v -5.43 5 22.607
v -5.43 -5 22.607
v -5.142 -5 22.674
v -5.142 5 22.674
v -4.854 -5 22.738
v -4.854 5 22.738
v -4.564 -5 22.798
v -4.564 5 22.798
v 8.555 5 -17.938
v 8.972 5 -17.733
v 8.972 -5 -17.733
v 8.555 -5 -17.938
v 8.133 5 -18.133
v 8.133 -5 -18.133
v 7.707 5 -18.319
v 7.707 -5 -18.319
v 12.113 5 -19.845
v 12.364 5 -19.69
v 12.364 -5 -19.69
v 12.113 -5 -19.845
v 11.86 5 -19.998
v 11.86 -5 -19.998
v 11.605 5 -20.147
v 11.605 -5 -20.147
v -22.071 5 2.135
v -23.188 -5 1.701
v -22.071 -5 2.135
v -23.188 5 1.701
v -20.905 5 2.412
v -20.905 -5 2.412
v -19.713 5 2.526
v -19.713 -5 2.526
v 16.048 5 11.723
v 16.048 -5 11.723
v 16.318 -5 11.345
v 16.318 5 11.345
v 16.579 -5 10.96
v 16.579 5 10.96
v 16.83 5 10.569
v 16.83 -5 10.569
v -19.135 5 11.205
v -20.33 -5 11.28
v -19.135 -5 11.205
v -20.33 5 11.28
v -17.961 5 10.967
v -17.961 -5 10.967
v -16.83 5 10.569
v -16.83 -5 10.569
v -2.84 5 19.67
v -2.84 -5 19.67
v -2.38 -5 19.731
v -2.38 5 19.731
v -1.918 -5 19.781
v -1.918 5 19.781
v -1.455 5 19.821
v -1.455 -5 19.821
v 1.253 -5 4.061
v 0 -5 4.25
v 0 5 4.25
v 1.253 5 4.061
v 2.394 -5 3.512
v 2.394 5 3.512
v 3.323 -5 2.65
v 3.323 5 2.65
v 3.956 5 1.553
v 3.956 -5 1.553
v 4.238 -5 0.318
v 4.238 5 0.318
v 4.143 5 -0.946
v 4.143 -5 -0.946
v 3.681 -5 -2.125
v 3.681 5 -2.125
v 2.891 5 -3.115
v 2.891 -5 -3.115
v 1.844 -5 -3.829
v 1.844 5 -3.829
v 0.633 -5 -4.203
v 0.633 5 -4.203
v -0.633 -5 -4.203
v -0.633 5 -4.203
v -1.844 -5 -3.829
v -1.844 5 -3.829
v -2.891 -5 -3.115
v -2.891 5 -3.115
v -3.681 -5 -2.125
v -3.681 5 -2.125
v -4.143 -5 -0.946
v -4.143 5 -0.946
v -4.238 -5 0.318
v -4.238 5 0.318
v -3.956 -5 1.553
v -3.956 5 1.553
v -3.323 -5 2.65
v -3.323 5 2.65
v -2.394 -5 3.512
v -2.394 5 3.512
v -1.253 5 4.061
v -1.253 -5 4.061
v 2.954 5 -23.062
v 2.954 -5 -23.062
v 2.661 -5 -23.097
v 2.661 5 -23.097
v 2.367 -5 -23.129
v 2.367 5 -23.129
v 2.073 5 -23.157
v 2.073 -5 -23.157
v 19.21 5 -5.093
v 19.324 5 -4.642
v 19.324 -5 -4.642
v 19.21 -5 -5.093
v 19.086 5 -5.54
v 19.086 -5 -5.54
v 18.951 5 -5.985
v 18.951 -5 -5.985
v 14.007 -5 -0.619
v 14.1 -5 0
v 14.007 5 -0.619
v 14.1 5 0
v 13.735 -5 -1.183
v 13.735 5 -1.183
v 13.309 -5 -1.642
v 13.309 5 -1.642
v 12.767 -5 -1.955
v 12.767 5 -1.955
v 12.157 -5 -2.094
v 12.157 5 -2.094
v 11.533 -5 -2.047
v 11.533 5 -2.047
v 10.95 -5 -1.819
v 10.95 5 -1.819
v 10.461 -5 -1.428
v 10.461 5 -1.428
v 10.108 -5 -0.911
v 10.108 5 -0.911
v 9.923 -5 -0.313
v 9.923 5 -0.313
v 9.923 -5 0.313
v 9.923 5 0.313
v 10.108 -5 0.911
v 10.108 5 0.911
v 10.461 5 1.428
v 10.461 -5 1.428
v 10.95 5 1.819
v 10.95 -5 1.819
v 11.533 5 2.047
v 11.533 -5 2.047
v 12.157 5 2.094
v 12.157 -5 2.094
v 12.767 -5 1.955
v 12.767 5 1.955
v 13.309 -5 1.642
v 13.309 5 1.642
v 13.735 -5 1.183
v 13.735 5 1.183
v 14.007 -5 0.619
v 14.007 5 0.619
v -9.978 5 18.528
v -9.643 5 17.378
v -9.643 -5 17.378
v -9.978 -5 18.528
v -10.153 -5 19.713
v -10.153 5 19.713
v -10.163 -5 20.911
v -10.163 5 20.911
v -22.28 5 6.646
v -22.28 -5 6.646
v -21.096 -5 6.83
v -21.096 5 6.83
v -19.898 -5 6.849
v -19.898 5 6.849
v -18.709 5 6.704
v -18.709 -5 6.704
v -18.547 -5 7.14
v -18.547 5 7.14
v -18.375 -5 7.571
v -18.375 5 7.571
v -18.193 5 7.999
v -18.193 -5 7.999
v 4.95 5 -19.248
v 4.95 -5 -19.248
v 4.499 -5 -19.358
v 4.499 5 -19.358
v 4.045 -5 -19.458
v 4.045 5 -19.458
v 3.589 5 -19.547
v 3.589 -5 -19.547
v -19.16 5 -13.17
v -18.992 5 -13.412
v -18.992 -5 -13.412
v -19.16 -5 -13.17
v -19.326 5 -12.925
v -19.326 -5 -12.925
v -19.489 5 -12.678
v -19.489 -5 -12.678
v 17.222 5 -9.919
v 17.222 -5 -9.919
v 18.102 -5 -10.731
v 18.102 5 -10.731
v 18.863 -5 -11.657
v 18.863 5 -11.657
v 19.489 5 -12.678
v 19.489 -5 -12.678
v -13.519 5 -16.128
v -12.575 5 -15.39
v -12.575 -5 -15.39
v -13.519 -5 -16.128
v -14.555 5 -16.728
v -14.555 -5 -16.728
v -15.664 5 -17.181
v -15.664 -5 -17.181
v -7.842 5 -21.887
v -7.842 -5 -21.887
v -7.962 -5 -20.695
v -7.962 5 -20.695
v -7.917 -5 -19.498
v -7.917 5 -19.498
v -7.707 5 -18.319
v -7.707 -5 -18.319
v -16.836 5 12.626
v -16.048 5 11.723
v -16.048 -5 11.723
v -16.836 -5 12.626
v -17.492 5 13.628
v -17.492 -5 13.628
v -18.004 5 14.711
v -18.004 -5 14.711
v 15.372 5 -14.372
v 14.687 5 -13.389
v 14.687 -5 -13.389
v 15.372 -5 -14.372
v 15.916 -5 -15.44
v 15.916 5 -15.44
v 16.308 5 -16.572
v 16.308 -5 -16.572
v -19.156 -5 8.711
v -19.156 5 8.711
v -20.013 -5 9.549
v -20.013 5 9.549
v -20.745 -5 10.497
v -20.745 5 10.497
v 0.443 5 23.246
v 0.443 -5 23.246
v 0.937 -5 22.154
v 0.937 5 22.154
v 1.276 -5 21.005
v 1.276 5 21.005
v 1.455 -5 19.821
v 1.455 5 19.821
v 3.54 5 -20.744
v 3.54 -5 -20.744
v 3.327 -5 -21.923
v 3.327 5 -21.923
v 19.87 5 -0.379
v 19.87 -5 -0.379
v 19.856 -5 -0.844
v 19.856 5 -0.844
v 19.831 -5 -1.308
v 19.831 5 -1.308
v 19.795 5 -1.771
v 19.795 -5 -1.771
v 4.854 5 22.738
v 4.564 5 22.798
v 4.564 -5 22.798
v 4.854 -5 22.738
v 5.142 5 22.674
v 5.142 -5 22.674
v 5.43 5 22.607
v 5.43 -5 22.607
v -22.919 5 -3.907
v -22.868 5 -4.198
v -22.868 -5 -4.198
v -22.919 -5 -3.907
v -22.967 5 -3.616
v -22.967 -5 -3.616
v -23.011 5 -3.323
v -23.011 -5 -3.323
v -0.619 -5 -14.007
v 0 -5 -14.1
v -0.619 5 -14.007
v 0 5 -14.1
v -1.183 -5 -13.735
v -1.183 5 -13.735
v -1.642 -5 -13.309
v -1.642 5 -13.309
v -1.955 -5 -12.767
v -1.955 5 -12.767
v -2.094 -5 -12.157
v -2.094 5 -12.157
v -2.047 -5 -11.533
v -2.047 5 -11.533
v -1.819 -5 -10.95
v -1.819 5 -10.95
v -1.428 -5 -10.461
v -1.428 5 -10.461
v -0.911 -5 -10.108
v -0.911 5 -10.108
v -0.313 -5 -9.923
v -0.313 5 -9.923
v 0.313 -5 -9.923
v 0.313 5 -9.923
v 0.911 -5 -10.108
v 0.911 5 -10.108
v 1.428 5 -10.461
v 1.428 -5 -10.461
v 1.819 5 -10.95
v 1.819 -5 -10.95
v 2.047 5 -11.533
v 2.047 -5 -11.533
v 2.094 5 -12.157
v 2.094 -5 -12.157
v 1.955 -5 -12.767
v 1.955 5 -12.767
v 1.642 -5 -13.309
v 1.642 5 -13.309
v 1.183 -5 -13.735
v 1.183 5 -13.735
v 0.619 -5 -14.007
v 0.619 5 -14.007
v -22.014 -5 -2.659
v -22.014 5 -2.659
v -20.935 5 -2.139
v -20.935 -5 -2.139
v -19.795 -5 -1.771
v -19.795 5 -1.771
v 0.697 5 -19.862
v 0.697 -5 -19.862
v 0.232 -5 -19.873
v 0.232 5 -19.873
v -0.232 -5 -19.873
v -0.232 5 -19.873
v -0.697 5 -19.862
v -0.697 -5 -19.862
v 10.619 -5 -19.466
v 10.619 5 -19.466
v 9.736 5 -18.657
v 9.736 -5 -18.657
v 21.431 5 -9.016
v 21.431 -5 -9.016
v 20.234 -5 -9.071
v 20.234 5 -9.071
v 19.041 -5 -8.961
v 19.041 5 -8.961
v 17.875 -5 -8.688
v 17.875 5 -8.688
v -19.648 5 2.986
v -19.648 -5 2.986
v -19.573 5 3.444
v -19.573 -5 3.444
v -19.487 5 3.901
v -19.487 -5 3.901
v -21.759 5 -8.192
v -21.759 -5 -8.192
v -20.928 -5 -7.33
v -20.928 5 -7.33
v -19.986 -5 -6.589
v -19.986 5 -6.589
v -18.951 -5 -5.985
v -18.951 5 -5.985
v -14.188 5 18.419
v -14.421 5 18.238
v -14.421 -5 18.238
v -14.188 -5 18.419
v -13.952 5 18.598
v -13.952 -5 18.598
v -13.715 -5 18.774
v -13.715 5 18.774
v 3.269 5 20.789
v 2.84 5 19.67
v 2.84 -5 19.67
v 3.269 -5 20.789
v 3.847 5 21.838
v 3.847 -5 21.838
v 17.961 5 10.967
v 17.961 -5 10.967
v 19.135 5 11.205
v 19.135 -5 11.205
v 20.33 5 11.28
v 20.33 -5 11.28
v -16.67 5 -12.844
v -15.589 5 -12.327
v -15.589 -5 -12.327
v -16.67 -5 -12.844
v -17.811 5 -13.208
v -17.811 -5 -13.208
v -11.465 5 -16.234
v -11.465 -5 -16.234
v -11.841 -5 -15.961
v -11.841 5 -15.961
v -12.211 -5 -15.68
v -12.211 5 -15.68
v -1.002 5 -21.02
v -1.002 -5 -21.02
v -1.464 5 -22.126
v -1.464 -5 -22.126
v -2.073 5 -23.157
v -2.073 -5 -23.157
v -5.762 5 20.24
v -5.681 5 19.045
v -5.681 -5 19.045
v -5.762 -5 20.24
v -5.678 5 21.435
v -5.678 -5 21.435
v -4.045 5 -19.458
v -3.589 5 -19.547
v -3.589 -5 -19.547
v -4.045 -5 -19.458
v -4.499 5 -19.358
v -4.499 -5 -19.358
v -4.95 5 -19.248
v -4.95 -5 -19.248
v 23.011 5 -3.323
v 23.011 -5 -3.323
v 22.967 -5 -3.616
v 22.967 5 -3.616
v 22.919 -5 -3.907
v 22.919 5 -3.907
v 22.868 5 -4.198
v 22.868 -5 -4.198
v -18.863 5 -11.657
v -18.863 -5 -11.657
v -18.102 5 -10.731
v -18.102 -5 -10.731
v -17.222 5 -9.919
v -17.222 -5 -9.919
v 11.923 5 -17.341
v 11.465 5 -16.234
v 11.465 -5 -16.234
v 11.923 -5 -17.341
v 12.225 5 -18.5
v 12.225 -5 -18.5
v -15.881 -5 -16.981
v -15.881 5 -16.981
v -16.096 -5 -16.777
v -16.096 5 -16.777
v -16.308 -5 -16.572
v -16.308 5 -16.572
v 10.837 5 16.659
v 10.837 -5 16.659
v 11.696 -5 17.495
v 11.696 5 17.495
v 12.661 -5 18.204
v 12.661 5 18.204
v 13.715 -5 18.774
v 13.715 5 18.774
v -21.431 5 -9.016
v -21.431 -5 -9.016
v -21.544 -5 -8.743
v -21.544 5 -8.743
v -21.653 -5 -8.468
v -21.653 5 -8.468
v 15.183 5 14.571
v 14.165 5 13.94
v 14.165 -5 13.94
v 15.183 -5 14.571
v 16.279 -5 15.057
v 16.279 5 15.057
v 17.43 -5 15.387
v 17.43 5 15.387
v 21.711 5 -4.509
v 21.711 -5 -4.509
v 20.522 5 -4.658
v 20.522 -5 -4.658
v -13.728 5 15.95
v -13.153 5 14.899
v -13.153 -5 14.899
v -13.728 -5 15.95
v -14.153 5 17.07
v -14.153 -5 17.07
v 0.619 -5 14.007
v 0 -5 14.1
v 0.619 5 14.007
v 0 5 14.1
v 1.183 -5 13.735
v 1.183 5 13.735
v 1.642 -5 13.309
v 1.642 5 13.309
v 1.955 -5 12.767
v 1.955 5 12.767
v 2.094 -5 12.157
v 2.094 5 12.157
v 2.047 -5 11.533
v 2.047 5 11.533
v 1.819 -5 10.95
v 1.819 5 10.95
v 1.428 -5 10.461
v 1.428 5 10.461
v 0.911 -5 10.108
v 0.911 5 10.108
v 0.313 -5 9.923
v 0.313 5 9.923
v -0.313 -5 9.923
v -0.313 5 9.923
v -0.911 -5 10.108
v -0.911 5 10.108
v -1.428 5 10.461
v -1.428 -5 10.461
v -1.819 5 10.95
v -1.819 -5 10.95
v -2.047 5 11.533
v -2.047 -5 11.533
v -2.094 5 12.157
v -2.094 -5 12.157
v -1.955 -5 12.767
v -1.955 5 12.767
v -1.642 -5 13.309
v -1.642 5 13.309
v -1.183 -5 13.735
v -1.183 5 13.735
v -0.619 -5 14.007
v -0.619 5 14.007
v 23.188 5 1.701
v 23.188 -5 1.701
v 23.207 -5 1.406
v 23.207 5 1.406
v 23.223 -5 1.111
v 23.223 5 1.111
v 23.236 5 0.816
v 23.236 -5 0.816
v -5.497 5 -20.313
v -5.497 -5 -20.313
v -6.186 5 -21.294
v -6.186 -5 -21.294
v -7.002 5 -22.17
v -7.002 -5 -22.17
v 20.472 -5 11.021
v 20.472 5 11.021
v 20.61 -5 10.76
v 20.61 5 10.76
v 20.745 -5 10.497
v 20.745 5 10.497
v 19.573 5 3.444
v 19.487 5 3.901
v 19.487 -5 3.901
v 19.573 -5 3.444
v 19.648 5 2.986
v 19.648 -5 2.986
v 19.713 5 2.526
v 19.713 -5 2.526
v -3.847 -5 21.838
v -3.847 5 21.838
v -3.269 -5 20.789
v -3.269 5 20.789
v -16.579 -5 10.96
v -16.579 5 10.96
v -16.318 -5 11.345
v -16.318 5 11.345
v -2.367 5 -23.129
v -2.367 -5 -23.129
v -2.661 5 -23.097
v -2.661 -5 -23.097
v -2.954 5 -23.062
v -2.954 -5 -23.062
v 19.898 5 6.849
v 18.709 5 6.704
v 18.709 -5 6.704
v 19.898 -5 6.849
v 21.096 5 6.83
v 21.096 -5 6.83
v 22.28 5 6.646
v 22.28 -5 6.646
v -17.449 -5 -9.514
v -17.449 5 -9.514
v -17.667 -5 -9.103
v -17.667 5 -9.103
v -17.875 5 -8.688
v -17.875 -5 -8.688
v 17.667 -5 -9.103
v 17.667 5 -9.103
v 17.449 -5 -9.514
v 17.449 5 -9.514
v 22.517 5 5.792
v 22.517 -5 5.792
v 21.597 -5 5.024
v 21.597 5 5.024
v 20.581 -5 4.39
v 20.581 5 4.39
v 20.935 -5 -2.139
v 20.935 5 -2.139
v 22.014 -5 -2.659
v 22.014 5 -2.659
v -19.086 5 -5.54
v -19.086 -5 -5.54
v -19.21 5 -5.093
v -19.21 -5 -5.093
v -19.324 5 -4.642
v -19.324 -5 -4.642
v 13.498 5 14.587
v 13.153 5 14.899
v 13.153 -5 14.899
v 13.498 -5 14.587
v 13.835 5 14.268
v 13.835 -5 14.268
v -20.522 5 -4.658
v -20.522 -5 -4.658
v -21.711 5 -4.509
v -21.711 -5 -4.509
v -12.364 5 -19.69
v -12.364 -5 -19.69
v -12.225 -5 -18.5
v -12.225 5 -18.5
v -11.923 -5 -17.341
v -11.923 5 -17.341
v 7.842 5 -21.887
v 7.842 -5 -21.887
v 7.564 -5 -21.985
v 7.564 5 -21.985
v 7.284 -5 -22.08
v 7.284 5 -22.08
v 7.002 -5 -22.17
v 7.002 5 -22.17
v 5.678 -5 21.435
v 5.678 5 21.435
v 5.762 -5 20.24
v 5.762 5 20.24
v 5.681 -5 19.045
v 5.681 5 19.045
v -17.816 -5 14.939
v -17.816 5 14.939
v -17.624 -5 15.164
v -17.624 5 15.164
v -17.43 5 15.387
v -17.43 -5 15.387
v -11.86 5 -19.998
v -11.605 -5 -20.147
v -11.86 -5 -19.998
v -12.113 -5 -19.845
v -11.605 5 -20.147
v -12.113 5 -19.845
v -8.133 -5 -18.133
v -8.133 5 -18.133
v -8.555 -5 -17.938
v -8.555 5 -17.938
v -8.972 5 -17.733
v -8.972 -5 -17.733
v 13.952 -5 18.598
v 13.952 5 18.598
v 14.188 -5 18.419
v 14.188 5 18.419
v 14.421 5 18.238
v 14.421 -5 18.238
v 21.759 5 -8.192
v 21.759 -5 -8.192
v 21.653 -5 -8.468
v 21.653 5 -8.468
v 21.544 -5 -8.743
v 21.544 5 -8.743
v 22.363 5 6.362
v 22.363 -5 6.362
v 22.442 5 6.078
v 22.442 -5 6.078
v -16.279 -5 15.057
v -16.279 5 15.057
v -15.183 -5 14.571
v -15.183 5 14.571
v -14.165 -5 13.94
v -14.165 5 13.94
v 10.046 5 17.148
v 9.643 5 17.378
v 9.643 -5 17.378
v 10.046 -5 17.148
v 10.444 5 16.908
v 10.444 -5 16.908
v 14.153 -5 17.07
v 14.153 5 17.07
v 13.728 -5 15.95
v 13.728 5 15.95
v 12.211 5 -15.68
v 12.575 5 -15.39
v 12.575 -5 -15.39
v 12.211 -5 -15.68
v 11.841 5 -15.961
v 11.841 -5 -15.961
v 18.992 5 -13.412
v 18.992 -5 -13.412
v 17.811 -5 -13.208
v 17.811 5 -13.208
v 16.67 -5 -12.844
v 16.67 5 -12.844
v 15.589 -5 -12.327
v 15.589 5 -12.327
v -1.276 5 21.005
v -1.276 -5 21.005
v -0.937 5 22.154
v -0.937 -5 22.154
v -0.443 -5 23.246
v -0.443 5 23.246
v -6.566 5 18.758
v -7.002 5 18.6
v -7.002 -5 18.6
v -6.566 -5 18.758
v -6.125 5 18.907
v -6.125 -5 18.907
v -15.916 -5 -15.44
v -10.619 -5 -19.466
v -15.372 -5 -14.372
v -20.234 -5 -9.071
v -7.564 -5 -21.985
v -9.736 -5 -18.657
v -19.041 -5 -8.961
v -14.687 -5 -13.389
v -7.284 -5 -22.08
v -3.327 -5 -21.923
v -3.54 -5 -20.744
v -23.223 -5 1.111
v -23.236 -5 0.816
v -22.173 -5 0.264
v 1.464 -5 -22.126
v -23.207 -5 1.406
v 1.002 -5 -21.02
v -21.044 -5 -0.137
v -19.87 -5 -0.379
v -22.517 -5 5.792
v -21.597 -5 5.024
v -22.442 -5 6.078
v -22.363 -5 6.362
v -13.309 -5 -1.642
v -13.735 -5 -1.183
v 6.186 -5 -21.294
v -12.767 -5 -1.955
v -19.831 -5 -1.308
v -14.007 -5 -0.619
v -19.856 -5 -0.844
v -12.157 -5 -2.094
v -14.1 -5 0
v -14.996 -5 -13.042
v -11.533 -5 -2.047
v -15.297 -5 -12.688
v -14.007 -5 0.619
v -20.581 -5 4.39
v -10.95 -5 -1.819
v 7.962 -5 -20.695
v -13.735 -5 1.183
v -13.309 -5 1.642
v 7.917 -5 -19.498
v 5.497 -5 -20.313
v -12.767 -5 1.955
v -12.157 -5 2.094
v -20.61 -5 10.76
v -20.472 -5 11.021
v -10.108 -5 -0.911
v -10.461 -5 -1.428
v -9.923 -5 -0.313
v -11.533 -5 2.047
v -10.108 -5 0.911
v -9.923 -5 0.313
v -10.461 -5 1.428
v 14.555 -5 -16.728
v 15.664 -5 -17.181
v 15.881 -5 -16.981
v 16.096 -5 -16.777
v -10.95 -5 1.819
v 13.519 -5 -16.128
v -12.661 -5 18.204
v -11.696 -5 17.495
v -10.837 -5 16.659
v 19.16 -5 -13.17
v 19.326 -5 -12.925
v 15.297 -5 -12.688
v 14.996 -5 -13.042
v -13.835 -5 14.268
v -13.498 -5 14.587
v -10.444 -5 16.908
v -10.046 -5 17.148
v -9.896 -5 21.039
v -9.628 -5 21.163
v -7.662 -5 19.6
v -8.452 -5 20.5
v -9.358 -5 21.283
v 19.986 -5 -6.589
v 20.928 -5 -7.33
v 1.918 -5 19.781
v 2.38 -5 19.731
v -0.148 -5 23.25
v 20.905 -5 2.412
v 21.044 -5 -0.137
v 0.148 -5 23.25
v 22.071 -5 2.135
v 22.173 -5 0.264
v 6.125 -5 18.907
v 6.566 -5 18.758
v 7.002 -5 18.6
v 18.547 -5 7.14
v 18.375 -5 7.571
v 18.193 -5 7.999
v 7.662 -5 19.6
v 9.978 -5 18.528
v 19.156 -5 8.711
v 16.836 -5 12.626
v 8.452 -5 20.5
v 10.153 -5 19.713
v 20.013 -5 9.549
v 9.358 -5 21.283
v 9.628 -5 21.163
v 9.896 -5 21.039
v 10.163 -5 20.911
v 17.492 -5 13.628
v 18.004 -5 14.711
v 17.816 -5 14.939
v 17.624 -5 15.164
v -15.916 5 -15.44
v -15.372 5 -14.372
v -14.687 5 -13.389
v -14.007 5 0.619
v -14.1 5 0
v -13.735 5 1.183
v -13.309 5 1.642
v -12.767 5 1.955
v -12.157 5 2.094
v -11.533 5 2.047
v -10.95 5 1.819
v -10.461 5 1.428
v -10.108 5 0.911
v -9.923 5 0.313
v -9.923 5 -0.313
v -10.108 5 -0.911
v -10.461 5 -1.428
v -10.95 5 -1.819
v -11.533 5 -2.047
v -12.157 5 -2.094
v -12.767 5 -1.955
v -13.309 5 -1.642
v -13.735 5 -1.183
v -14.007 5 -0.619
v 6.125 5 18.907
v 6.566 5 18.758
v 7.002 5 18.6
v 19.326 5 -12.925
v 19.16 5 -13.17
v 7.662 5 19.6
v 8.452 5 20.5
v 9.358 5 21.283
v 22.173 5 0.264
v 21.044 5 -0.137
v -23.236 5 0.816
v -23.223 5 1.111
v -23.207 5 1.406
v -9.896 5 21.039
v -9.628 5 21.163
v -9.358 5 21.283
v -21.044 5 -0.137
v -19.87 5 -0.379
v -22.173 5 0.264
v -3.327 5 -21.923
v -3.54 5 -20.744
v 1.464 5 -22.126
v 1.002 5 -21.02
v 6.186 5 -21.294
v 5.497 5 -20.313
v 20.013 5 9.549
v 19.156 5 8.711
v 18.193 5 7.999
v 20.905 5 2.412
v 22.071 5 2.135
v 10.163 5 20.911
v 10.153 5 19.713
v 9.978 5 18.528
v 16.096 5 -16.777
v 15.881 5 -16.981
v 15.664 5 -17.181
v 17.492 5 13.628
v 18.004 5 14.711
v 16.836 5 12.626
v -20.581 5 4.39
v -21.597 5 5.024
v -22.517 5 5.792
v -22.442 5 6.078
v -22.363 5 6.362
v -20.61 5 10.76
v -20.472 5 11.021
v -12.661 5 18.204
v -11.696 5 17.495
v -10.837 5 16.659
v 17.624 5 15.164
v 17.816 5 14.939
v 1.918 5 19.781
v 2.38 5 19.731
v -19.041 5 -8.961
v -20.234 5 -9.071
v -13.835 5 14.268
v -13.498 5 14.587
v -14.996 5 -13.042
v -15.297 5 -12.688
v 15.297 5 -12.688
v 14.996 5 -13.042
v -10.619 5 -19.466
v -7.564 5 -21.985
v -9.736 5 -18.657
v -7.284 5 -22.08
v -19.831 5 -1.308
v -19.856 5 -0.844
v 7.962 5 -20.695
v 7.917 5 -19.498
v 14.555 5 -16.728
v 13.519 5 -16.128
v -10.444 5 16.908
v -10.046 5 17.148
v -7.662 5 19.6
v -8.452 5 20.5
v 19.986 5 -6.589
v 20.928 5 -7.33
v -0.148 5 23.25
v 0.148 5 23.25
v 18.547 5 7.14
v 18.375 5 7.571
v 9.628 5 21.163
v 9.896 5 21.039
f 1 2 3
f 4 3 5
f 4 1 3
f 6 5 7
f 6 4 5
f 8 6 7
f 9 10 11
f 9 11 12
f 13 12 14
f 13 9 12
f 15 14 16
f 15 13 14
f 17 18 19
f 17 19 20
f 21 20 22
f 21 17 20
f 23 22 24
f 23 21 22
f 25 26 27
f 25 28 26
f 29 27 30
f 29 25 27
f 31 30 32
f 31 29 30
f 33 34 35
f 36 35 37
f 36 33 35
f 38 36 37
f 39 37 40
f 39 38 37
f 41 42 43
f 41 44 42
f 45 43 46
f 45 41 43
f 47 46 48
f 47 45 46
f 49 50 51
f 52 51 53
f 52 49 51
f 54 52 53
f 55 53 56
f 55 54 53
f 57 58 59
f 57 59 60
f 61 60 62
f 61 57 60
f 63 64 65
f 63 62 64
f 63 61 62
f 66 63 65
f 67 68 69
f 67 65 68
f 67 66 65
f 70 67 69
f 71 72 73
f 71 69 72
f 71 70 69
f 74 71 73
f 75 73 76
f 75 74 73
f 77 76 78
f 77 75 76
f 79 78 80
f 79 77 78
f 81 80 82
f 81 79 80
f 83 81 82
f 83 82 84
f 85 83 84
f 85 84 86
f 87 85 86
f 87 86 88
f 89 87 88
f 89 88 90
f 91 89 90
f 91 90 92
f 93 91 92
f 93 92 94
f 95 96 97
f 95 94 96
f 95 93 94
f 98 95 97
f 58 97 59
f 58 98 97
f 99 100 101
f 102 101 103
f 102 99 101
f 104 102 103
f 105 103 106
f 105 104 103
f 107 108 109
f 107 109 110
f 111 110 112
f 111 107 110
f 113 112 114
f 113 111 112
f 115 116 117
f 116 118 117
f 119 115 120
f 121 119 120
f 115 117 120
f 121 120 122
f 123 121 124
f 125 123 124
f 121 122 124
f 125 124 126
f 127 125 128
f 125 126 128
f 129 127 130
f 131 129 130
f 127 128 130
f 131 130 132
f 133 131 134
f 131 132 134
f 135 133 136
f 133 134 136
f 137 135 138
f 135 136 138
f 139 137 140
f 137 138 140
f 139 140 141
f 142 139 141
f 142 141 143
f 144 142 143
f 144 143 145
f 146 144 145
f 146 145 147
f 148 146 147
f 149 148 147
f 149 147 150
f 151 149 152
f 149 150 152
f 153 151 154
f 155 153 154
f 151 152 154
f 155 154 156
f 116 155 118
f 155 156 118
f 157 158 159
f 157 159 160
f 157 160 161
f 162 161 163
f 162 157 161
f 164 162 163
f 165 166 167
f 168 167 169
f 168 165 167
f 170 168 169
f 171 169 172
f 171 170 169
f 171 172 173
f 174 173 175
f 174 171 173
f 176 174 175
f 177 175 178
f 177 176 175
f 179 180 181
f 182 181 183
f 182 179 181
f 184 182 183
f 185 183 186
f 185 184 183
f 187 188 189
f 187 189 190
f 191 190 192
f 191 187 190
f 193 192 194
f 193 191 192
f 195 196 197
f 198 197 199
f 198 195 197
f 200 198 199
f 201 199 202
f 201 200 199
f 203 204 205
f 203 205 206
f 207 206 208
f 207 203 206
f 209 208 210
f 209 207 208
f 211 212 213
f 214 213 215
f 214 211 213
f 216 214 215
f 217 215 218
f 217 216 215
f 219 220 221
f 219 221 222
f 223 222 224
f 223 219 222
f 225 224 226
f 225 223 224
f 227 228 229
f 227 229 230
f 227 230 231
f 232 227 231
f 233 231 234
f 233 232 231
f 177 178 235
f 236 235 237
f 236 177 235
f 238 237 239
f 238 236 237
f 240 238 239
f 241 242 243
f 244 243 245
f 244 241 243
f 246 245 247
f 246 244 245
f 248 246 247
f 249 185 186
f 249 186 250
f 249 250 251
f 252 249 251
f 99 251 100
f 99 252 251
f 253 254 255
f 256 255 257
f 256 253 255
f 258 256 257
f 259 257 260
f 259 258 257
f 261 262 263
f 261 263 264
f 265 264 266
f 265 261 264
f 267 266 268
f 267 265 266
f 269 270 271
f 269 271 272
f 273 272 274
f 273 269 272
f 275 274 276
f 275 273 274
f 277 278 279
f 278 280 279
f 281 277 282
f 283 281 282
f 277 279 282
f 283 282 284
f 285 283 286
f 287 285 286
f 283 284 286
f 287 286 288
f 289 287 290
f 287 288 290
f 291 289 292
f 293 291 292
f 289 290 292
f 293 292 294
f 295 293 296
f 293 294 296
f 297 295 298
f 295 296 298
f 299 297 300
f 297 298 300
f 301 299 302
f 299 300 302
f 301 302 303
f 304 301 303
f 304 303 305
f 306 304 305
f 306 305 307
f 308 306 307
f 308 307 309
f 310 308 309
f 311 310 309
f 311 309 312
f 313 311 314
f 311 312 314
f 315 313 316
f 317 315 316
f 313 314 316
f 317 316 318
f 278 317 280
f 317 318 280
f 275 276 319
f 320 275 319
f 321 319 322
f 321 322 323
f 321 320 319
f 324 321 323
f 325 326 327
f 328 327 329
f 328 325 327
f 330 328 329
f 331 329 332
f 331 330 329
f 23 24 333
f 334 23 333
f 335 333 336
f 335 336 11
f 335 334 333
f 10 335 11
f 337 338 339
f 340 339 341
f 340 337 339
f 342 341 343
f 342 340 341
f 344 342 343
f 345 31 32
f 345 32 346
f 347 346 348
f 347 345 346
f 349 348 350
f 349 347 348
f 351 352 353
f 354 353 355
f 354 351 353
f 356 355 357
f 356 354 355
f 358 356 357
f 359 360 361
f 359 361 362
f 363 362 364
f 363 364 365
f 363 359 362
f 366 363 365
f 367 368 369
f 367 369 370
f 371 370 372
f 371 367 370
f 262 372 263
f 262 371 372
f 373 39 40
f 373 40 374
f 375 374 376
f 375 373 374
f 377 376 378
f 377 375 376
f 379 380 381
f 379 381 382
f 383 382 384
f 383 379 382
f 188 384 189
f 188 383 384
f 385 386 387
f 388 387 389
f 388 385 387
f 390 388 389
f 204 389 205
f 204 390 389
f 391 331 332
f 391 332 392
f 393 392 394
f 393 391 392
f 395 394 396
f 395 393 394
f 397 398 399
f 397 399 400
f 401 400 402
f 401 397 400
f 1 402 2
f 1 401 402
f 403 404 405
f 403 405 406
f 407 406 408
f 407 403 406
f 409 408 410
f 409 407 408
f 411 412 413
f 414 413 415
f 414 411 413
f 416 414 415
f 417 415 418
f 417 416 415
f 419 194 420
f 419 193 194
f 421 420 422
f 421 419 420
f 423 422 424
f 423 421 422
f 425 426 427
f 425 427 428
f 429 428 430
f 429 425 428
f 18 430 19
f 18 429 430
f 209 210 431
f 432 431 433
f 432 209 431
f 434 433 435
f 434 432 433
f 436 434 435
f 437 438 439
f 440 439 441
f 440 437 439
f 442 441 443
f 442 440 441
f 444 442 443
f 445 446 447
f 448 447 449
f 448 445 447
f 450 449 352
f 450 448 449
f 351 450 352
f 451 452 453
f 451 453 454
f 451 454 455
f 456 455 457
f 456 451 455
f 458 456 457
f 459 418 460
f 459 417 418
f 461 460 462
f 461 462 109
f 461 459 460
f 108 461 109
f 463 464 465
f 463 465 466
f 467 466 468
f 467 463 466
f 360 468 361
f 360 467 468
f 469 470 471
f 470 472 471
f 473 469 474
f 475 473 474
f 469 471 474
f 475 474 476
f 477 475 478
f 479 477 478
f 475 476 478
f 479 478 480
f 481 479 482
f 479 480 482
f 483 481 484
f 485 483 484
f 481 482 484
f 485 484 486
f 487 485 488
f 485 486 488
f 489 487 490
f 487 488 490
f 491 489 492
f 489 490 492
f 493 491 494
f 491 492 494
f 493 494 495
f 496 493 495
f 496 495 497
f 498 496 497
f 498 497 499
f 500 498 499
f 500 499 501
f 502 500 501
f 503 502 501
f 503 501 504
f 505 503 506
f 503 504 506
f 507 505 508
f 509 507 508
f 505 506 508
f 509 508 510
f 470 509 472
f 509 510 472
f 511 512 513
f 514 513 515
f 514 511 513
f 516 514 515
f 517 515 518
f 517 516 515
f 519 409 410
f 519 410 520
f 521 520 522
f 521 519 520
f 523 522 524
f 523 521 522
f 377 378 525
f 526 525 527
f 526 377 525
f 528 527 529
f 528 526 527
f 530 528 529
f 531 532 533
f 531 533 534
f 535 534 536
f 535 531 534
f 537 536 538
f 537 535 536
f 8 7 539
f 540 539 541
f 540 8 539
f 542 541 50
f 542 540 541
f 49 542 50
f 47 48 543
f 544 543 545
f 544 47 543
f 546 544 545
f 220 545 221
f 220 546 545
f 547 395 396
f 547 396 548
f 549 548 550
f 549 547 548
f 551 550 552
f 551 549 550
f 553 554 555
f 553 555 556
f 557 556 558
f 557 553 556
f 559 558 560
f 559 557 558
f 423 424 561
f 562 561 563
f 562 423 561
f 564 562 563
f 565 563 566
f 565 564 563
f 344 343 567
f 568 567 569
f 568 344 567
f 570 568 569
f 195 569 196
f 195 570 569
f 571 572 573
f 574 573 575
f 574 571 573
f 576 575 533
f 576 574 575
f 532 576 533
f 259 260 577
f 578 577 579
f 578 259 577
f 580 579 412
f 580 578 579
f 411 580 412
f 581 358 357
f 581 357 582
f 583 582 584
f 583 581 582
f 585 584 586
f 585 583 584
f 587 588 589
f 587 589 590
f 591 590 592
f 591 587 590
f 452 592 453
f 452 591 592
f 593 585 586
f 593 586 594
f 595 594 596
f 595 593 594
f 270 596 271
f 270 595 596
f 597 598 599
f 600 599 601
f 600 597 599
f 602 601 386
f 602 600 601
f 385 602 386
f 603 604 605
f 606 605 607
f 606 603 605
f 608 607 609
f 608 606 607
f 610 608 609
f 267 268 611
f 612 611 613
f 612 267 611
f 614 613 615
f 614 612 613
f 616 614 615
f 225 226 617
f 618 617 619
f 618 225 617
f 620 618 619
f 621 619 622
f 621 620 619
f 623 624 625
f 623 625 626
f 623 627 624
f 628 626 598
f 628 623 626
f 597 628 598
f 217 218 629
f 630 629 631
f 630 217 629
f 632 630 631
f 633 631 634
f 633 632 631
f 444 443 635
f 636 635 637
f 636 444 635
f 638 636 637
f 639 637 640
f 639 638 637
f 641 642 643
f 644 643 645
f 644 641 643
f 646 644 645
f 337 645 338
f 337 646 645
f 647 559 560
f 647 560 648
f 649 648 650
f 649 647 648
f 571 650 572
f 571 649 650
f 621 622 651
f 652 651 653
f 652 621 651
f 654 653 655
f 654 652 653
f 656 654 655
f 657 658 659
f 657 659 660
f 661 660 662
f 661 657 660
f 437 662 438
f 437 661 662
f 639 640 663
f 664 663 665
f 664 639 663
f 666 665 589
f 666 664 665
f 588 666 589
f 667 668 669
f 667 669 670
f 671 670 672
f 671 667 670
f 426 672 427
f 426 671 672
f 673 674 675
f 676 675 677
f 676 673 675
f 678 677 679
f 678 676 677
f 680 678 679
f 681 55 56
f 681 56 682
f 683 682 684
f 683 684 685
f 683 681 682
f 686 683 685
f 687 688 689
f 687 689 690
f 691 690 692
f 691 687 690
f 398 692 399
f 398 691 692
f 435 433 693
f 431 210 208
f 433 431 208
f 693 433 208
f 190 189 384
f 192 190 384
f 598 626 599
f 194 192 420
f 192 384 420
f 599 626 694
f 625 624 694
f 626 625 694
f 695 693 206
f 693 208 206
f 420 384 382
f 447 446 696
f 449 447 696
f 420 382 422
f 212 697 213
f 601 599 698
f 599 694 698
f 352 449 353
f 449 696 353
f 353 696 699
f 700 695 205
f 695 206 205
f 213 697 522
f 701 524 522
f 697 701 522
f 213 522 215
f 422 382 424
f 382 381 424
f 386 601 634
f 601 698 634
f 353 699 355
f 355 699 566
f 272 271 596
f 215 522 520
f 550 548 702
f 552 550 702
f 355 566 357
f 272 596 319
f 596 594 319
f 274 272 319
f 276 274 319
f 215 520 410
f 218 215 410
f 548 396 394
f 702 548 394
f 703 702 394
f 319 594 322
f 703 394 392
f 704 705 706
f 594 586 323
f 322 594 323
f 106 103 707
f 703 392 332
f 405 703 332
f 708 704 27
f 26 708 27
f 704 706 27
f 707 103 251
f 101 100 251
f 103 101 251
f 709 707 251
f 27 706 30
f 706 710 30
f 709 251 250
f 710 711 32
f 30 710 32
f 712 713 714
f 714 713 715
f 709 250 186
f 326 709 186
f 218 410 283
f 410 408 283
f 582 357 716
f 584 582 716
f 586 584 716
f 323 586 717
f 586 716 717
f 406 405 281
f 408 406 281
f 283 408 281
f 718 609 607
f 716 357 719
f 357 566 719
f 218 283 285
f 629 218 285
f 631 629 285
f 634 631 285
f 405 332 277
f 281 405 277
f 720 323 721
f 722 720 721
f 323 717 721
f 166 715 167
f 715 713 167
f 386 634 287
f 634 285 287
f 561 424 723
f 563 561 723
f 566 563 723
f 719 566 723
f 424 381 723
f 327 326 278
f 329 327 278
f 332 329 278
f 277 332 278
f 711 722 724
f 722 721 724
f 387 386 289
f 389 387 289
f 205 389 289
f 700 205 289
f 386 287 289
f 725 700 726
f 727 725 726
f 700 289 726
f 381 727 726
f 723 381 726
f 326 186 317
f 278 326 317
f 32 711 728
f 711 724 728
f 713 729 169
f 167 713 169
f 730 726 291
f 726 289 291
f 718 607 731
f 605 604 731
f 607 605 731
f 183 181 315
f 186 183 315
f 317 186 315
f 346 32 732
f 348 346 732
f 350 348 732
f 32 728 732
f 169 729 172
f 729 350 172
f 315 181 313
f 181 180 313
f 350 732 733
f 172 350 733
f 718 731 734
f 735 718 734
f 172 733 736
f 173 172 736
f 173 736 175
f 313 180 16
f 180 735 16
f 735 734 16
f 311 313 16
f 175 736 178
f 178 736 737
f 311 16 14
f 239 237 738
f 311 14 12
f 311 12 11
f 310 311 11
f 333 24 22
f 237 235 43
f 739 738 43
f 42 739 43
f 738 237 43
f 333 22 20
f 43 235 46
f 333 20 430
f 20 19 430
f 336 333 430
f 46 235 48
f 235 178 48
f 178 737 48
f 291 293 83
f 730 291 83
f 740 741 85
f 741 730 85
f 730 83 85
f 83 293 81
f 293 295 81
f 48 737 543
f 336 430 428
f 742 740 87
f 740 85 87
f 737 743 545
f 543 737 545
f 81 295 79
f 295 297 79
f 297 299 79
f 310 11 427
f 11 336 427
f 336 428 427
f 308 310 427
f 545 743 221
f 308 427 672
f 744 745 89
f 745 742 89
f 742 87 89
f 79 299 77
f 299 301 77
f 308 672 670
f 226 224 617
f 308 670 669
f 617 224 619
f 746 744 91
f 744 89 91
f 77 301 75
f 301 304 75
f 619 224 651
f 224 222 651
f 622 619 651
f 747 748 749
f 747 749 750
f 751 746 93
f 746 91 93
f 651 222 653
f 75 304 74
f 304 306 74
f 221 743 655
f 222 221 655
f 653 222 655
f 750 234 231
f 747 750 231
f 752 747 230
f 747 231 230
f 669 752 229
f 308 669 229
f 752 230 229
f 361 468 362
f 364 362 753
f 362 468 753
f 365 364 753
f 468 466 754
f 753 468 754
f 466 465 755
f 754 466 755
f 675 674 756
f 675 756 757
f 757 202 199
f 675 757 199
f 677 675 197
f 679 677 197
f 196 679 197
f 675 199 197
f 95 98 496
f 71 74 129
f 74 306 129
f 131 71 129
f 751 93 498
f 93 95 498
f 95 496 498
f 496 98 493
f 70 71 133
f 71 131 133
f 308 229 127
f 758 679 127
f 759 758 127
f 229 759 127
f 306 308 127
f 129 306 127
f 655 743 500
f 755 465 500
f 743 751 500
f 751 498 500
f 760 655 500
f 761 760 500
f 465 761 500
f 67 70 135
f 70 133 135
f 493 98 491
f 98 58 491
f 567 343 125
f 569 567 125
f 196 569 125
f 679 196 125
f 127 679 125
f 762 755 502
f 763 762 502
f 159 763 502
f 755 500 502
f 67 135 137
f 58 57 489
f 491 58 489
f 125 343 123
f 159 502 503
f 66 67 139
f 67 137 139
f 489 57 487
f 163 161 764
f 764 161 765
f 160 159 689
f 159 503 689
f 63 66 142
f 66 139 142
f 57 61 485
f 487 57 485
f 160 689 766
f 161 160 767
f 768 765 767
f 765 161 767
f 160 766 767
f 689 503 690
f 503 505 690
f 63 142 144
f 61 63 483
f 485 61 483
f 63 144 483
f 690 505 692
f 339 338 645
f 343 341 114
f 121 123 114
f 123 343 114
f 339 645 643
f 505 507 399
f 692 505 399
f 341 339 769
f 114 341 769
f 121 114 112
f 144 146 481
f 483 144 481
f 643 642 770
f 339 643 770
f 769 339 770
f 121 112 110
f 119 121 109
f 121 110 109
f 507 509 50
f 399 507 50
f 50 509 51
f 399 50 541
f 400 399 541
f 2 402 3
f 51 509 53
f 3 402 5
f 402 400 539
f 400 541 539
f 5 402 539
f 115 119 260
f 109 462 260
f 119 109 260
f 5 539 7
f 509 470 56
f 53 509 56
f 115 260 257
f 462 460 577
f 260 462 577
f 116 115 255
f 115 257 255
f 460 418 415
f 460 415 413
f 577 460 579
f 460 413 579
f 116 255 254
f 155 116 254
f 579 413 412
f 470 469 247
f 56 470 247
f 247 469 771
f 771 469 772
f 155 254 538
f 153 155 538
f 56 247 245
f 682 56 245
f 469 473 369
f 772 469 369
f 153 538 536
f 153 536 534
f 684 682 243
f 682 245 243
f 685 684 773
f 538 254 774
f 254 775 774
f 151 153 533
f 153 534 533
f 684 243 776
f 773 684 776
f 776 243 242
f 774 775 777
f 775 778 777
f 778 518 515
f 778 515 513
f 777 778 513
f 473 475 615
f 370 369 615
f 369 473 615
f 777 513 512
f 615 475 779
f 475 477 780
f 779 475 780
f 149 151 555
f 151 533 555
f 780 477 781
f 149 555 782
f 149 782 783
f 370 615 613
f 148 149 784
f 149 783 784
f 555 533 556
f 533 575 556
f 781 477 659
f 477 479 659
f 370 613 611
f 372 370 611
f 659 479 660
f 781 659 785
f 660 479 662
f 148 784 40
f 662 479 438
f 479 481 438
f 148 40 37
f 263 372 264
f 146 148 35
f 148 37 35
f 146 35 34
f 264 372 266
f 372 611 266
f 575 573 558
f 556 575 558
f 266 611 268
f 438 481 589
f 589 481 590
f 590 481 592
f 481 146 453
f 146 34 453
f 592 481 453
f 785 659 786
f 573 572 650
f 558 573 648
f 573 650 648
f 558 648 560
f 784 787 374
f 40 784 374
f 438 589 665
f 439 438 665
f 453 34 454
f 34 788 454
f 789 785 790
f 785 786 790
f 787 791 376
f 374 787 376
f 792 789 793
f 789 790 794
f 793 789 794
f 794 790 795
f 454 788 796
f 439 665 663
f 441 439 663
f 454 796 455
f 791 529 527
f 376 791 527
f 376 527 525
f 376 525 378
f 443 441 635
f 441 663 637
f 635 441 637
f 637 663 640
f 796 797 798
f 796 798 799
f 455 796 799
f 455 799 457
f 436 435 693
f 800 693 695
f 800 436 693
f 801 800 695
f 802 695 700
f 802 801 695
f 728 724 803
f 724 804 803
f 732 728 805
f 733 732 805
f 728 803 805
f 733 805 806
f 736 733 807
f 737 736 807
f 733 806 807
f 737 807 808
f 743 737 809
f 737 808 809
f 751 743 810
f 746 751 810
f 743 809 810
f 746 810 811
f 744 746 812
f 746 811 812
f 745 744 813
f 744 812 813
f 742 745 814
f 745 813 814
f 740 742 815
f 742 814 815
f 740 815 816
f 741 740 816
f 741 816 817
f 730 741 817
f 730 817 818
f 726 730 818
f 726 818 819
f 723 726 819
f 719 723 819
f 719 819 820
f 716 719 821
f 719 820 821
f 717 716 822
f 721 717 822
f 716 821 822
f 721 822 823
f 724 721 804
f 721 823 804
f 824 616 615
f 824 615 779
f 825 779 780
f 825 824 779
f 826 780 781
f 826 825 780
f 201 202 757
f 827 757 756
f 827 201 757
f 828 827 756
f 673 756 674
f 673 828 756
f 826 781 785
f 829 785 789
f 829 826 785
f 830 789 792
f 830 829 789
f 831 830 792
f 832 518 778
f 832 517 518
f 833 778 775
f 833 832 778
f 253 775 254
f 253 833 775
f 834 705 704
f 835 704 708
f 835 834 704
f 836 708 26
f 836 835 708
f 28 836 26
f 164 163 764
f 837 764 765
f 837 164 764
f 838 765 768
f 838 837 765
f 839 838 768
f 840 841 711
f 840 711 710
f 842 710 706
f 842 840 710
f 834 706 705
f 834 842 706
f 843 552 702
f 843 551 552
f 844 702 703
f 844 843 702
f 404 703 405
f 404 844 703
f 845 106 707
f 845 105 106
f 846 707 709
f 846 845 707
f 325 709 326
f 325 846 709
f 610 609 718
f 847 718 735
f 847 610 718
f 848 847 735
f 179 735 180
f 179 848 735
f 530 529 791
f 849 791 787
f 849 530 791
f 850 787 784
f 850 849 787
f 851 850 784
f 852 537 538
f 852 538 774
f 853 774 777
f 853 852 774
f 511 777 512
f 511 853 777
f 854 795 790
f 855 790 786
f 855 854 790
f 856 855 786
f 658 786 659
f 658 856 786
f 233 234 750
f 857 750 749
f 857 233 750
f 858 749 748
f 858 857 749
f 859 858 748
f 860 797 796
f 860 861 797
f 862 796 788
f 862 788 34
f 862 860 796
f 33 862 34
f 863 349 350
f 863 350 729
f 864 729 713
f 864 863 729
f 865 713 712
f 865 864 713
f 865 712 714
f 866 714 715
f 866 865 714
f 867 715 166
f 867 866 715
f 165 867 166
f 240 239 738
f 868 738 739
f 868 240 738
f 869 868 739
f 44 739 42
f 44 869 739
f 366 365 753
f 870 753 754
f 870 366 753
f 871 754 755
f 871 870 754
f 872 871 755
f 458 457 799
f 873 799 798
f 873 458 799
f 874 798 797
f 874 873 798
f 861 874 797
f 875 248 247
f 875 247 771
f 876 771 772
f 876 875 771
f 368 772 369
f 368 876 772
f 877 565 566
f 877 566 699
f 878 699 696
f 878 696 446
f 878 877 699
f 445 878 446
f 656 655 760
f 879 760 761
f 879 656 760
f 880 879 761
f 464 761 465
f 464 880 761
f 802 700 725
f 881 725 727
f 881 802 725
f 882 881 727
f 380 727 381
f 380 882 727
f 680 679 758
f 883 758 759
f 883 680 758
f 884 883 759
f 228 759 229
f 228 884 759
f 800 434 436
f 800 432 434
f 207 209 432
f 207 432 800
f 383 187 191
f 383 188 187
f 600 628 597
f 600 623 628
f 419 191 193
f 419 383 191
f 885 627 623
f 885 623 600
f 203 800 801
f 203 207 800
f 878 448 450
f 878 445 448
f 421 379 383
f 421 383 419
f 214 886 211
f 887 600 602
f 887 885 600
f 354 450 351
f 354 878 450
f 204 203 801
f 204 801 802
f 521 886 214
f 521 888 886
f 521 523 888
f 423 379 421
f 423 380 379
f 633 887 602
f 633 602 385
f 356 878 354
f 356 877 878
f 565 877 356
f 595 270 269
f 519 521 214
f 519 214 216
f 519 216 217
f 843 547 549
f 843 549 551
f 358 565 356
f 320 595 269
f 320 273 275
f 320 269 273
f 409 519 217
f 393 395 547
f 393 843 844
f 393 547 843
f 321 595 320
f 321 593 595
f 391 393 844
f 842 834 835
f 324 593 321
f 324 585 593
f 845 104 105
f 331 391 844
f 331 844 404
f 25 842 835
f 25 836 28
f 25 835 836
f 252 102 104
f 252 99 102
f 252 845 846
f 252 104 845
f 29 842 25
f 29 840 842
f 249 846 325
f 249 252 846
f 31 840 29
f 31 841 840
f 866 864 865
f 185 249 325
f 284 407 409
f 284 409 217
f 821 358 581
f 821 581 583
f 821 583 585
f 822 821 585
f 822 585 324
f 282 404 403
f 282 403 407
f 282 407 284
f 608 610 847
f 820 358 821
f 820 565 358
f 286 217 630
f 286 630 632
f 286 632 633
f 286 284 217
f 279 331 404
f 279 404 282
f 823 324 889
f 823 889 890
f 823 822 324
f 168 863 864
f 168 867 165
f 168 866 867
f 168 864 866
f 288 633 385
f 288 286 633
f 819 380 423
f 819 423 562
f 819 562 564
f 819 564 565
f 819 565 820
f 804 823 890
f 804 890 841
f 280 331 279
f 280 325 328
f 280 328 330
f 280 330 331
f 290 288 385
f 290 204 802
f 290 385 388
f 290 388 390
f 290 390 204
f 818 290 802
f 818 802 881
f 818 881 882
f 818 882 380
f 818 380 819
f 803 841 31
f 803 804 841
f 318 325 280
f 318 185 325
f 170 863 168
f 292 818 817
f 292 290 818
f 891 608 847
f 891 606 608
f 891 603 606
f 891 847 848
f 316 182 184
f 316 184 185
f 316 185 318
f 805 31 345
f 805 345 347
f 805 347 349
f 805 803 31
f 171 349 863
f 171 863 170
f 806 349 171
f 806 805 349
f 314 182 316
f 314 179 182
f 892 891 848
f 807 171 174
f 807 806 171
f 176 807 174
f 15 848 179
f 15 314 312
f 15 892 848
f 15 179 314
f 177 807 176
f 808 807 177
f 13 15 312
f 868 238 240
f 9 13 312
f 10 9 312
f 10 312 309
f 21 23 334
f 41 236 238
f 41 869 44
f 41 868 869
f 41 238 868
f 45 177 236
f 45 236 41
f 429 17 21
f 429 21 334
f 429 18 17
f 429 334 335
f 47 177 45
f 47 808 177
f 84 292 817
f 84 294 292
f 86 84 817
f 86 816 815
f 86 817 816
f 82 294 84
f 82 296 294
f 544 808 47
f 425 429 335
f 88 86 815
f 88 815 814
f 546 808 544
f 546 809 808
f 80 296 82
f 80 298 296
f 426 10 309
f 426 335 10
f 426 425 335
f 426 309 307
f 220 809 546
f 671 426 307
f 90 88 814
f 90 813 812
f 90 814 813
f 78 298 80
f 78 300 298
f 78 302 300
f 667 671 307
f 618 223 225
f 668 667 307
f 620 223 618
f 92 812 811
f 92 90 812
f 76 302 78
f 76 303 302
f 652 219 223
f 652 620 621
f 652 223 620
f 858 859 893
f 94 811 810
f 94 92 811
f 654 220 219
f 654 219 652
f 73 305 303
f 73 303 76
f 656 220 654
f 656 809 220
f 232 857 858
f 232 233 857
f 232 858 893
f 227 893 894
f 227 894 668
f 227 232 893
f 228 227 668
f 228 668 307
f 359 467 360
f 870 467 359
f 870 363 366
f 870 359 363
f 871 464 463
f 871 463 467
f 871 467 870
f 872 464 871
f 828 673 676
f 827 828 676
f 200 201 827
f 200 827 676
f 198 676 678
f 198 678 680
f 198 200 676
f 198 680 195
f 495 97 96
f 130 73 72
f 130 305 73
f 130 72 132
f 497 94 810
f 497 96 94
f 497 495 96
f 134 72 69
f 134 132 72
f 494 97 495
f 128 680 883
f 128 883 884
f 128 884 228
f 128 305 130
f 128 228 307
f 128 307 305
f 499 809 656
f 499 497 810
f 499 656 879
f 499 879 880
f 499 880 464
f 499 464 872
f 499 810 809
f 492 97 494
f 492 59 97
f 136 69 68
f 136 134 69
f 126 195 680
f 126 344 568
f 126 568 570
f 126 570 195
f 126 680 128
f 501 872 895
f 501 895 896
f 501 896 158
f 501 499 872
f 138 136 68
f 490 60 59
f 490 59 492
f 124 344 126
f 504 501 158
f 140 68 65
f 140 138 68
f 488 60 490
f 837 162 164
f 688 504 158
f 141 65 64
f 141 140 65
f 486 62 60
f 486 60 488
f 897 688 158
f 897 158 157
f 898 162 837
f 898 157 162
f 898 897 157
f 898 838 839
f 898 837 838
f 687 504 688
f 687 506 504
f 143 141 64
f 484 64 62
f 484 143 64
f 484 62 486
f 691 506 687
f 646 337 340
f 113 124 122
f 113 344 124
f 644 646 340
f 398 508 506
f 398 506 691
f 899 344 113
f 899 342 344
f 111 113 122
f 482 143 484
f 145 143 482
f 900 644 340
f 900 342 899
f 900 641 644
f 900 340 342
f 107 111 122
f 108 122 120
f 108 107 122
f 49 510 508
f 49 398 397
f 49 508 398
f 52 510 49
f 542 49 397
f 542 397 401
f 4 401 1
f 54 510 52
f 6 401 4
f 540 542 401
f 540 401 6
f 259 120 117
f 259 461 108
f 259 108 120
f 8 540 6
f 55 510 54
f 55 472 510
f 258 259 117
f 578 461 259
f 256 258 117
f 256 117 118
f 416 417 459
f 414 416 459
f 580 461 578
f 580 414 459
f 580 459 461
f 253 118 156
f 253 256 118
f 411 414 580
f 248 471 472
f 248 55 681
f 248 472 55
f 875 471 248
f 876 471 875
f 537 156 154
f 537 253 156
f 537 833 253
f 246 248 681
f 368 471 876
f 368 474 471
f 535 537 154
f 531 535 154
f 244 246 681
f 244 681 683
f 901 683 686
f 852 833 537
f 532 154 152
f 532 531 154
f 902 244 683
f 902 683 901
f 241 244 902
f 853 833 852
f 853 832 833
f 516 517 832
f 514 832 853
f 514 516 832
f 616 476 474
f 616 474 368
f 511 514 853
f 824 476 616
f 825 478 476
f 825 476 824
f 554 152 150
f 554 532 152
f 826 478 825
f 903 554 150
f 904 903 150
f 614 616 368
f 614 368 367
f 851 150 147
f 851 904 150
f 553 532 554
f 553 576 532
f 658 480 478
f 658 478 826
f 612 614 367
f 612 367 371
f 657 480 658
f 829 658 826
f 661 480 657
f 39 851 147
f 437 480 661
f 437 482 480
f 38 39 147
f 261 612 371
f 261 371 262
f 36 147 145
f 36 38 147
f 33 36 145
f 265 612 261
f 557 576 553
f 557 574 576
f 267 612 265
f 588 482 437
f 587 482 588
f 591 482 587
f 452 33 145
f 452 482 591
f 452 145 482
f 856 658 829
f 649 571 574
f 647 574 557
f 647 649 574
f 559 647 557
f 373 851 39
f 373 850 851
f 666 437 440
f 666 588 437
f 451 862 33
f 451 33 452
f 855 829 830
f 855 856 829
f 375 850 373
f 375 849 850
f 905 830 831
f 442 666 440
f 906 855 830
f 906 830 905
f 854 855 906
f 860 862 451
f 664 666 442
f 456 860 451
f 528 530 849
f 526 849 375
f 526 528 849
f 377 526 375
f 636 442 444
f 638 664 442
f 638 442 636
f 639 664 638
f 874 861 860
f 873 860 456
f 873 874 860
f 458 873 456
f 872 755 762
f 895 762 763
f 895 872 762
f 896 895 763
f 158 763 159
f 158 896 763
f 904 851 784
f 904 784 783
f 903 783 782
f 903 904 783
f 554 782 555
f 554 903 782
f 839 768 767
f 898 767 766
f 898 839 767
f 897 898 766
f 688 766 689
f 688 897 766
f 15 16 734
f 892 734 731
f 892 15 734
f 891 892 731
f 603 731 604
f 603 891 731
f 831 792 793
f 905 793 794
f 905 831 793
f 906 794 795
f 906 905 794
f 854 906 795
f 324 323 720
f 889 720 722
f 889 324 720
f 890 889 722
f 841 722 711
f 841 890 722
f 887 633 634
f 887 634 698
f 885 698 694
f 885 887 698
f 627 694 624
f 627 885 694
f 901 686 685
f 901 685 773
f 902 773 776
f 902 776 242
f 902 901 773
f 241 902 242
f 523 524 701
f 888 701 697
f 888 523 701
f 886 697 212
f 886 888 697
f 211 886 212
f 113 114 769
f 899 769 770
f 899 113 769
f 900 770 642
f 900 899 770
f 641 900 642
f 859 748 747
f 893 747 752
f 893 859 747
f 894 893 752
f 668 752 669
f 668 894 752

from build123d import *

# Parameters (mm, degrees)
SKETCH1_R               = 23.25
BOSS_EXTRUDE1_DEPTH     = 5
CUT_EXTRUDE1_DEPTH      = 34.258457571
CIRPATTERN1_COUNT       = 29
CUT_EXTRUDE2_DEPTH      = 35.357810434
CUT_EXTRUDE2_DEPTH_BACK = 35.357810434
SKETCH3_R               = 4.25
SKETCH4_R               = 2.1
CUT_EXTRUDE3_DEPTH      = 35.357810434
CIRPATTERN2_COUNT       = 4


with BuildPart() as part:
    # Sketch1 → Boss-Extrude1 (new, symmetric)
    with BuildSketch(Plane(origin=(0, 0, 0), x_dir=(1, 0, 0), z_dir=(0, 1, 0))):
        with Locations(Location((0, 0, 0), (0, 0, 270))):
            Circle(SKETCH1_R)
    extrude(amount=BOSS_EXTRUDE1_DEPTH, both=True)

    # Sketch2 → Cut-Extrude1 (cut, symmetric)
    with BuildSketch(Plane(origin=(0, 0, 0), x_dir=(1, 0, 0), z_dir=(0, 1, 0))):
        with BuildLine():
            ThreePointArc((0.696879992, 19.861778225), (0, 19.874), (-0.696879992, 19.861778225))
            ThreePointArc((-0.696879992, 19.861778225), (-1.219525976, 21.594414991), (-2.089327454, 23.181435589))
            ThreePointArc((-2.089327454, 23.181435589), (0, 23.2754), (2.089327454, 23.181435589))
            ThreePointArc((2.089327454, 23.181435589), (1.219525976, 21.594414991), (0.696879992, 19.861778225))
        make_face()
    cut_extrude1 = extrude(amount=CUT_EXTRUDE1_DEPTH, both=True, mode=Mode.SUBTRACT)

    # CirPattern1: Cut-Extrude1 ×29 about axis
    cirpattern1_axis = Axis((0, 0, 0), (0, 1, 0))
    for i in range(1, CIRPATTERN1_COUNT):
        add(cut_extrude1.rotate(cirpattern1_axis, i * 360 / CIRPATTERN1_COUNT), mode=Mode.SUBTRACT)

    # Sketch3 → Cut-Extrude2 (cut, two sides: drawn at the far end of the back side and taken through both)
    with BuildSketch(Plane(origin=(0, 5, 0), x_dir=(1, 0, 0), z_dir=(0, 1, 0)).offset(-CUT_EXTRUDE2_DEPTH_BACK)):
        with Locations(Location((0, 0, 0), (0, 0, 270))):
            Circle(SKETCH3_R)
    extrude(amount=CUT_EXTRUDE2_DEPTH + CUT_EXTRUDE2_DEPTH_BACK, mode=Mode.SUBTRACT)

    # Sketch4 → Cut-Extrude3 (cut, symmetric)
    with BuildSketch(Plane(origin=(0, 5, 0), x_dir=(1, 0, 0), z_dir=(0, 1, 0))):
        with Locations(Location((0, -12, 0), (0, 0, 270))):
            Circle(SKETCH4_R)
    cut_extrude3 = extrude(amount=CUT_EXTRUDE3_DEPTH, both=True, mode=Mode.SUBTRACT)

    # CirPattern2: Cut-Extrude3 ×4 about axis
    cirpattern2_axis = Axis((0, 0, 0), (0, 1, 0))
    for i in range(1, CIRPATTERN2_COUNT):
        add(cut_extrude3.rotate(cirpattern2_axis, i * 360 / CIRPATTERN2_COUNT), mode=Mode.SUBTRACT)


solid = part.part
